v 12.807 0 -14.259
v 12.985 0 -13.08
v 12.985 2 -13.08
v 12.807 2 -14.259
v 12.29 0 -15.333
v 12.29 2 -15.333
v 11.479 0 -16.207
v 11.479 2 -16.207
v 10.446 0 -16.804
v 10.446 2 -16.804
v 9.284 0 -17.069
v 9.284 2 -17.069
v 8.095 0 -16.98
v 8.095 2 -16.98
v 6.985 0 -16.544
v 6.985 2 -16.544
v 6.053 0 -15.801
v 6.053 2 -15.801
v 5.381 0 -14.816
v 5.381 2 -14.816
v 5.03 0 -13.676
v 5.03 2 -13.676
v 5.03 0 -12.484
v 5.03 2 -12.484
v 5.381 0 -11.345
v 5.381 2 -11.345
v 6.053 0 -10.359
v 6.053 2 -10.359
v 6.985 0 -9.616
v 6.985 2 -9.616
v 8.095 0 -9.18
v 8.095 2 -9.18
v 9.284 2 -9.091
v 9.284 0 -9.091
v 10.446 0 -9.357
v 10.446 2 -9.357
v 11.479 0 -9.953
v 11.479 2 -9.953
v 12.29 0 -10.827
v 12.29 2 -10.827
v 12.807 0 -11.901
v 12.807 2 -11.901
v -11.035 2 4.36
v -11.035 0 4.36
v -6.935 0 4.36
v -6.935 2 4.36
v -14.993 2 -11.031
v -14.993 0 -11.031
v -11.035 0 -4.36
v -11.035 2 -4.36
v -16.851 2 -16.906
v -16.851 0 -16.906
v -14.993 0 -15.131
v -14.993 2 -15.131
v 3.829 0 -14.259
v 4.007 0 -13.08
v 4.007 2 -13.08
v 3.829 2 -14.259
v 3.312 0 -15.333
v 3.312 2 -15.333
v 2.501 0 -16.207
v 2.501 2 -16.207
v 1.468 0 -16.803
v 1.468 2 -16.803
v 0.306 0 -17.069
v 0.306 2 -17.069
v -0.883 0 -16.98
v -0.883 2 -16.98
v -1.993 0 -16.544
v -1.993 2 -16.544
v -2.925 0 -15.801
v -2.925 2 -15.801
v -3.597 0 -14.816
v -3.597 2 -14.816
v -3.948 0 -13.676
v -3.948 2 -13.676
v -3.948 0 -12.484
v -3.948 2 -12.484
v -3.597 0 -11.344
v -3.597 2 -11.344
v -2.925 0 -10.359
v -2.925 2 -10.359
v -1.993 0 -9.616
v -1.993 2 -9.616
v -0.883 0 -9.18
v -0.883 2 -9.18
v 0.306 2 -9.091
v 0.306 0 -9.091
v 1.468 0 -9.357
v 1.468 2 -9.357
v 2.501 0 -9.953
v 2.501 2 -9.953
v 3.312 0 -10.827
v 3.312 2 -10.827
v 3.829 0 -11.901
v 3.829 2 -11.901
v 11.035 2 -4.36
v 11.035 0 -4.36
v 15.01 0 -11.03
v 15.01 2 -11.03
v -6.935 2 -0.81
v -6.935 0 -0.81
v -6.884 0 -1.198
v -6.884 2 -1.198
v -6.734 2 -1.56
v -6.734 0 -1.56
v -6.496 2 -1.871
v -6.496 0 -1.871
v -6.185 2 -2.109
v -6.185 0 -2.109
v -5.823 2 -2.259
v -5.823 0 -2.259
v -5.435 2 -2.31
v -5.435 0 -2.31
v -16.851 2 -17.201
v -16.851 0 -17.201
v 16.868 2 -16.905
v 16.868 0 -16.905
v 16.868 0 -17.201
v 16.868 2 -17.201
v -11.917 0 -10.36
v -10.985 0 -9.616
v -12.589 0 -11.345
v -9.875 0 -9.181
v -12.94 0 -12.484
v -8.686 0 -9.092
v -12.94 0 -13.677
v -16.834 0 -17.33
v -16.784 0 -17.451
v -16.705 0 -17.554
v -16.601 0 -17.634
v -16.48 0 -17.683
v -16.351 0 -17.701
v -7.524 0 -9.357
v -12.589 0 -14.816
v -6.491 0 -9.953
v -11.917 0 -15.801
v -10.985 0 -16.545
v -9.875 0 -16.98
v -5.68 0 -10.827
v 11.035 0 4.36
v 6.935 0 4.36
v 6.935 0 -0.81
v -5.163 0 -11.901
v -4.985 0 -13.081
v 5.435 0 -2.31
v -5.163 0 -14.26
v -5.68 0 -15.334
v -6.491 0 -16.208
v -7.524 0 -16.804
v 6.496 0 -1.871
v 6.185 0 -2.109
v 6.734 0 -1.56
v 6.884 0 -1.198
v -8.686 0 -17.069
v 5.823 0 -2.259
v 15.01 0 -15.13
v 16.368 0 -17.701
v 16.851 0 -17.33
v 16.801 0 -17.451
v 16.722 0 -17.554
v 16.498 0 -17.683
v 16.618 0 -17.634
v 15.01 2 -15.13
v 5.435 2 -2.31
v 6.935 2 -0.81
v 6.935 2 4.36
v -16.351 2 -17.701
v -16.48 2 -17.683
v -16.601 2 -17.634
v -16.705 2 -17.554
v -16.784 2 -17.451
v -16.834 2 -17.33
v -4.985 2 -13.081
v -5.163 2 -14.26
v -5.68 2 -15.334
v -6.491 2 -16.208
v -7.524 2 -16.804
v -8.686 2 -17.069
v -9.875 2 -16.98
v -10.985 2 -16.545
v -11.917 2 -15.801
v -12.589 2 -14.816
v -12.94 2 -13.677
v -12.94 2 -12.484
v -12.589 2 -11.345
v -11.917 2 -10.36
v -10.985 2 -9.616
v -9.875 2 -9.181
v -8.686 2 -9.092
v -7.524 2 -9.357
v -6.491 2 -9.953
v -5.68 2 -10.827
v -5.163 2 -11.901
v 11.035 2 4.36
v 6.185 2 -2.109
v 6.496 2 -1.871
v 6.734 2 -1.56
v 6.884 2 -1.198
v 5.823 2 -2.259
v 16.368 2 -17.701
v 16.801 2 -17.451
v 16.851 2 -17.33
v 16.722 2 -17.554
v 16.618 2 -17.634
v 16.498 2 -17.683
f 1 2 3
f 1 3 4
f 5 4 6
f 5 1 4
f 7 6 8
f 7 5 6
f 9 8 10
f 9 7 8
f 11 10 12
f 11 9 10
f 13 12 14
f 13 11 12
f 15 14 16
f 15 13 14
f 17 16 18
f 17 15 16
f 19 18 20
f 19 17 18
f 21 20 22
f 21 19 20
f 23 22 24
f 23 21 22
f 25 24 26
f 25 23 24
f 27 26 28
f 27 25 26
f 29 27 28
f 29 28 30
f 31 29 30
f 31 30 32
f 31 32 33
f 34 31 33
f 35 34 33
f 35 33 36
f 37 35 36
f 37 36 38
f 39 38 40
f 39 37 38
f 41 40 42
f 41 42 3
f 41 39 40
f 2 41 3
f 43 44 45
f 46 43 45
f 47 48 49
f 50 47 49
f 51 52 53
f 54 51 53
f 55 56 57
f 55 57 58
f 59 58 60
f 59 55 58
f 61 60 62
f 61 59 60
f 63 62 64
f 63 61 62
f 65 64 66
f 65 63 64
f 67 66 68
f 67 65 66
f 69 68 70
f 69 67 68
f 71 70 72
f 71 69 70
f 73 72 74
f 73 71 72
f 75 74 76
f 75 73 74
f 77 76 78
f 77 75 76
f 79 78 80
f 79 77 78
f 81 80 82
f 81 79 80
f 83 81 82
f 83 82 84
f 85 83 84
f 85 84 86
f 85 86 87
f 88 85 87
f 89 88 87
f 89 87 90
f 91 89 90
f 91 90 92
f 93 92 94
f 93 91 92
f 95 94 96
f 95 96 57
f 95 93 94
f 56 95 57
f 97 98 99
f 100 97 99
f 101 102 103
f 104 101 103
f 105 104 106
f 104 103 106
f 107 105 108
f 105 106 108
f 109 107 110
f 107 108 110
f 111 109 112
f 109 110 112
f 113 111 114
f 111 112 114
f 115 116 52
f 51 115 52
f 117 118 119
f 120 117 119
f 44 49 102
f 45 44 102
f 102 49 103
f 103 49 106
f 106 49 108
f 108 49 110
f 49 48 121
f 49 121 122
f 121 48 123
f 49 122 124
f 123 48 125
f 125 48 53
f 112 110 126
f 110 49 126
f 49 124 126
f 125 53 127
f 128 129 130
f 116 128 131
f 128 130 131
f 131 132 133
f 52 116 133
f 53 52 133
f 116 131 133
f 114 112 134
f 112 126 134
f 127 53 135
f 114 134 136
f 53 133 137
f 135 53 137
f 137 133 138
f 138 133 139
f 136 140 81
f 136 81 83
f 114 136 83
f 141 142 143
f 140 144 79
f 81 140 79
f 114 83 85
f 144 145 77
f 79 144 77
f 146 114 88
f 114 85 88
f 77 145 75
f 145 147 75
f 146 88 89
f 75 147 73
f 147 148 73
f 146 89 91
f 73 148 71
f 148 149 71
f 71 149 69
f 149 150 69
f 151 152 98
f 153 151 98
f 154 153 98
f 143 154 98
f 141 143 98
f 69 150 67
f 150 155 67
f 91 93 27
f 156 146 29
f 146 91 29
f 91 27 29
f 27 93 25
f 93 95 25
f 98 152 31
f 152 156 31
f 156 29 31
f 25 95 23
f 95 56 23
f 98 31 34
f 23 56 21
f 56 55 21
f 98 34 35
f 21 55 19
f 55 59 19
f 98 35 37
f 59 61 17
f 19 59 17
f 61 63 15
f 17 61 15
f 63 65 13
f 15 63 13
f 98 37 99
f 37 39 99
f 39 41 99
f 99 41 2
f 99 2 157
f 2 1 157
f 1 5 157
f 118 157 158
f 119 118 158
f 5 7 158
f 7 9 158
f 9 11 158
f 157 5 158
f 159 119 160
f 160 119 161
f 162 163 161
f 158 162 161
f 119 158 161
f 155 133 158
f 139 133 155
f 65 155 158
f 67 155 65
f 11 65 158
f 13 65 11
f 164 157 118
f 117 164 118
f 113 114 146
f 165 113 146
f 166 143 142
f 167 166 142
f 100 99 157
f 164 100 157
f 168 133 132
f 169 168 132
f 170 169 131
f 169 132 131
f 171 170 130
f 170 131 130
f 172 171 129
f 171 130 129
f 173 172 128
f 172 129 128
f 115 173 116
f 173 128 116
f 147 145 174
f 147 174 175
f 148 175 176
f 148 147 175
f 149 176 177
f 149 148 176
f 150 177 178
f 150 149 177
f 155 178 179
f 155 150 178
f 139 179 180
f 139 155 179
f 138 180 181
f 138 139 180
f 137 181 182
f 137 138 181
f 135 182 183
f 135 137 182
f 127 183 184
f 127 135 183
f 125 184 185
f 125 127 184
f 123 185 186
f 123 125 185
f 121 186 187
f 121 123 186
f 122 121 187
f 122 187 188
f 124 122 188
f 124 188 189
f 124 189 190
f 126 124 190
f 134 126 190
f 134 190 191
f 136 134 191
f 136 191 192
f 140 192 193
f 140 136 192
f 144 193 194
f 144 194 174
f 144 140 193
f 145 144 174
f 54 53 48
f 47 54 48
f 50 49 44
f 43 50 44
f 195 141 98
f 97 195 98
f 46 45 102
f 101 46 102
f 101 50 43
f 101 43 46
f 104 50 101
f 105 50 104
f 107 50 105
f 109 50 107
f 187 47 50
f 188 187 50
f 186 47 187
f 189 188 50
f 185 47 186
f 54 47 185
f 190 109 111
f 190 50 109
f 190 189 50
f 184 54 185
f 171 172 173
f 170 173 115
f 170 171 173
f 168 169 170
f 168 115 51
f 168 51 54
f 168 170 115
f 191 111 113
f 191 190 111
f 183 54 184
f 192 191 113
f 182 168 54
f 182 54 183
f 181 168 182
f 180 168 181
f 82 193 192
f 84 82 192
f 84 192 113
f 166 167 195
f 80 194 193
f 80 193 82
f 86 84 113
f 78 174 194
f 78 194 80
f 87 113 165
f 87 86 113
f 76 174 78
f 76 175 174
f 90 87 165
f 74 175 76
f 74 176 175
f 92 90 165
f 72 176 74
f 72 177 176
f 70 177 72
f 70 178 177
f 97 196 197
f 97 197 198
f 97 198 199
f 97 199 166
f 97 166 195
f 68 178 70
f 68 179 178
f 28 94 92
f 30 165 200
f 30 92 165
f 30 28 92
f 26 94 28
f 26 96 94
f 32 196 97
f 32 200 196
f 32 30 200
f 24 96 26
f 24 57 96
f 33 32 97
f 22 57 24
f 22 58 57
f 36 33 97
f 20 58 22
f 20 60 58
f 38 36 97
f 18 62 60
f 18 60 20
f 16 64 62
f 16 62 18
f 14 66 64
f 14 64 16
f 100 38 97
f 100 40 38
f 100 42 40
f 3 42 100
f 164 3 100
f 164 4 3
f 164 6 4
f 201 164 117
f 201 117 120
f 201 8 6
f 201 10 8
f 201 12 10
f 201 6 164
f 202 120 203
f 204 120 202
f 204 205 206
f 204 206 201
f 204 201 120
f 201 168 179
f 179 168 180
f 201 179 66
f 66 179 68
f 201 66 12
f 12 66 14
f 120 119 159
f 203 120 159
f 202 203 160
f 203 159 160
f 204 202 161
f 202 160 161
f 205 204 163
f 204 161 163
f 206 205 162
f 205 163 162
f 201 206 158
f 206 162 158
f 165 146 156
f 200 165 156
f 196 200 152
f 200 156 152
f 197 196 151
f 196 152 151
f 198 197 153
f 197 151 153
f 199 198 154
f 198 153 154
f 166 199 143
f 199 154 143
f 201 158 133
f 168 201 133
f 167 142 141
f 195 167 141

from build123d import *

# Parameters (mm, degrees)
ESTRUSIONE_ESTRUSIONE8_DEPTH = 2
SCHIZZO8_R                   = 4
TAGLIO_ESTRUSIONE6_DEPTH     = 2
SCHIZZO15_R                  = 4
TAGLIO_ESTRUSIONE7_DEPTH     = 2
SCHIZZO16_R                  = 4
TAGLIO_ESTRUSIONE9_DEPTH     = 2


with BuildPart() as part:
    # Schizzo2 → Estrusione-Estrusione8 (new body)
    with BuildSketch(Plane(origin=(0, 0, 0), x_dir=(1, 0, 0), z_dir=(0, 1, 0))):
        with BuildLine():
            Line((-6.935, -4.36), (-6.935, 0.81))
            ThreePointArc((-6.935, 0.81), (-6.495660172, 1.870660172), (-5.435, 2.31))
            Line((-5.435, 2.31), (5.435, 2.31))
            ThreePointArc((5.435, 2.31), (6.495660172, 1.870660172), (6.935, 0.81))
            Line((6.935, 0.81), (6.935, -4.36))
            Line((6.935, -4.36), (11.035, -4.36))
            Line((11.035, -4.36), (11.035, 4.36))
            Line((11.035, 4.36), (15.01, 11.03))
            Line((15.01, 11.03), (15.01, 15.13))
            Line((15.01, 15.13), (16.868239421, 16.905343982))
            Line((16.868239421, 16.905343982), (16.868239421, 17.200505886))
            ThreePointArc((16.868239421, 17.200505886), (16.721792811, 17.554059277), (16.368239421, 17.700505886))
            Line((16.368239421, 17.700505886), (-14.992624707, 17.700505886))
            Line((-14.992624707, 17.700505886), (-16.351038686, 17.700505886))
            ThreePointArc((-16.351038686, 17.700505886), (-16.704592076, 17.554059277), (-16.851038686, 17.200505886))
            Line((-16.851038686, 17.200505886), (-16.851038686, 16.905667142))
            Line((-16.851038686, 16.905667142), (-14.992624707, 15.130505886))
            Line((-14.992624707, 15.130505886), (-14.992624707, 11.030505886))
            Line((-14.992624707, 11.030505886), (-11.035, 4.36))
            Line((-11.035, 4.36), (-11.035, -4.36))
            Line((-11.035, -4.36), (-6.935, -4.36))
        make_face()
    extrude(amount=ESTRUSIONE_ESTRUSIONE8_DEPTH)

    # Schizzo8 → Taglio-Estrusione6 (cut)
    with BuildSketch(Plane(origin=(0, 0, 0), x_dir=(1, 0, 0), z_dir=(0, 1, 0))):
        with Locations((8.985, 13.08010159)):
            Circle(SCHIZZO8_R)
    extrude(amount=TAGLIO_ESTRUSIONE6_DEPTH, mode=Mode.SUBTRACT)

    # Schizzo15 → Taglio-Estrusione7 (cut)
    with BuildSketch(Plane(origin=(0, 0, 0), x_dir=(1, 0, 0), z_dir=(0, 1, 0))):
        with Locations((0.00688301, 13.08)):
            Circle(SCHIZZO15_R)
    extrude(amount=TAGLIO_ESTRUSIONE7_DEPTH, mode=Mode.SUBTRACT)

    # Schizzo16 → Taglio-Estrusione9 (cut)
    with BuildSketch(Plane(origin=(0, 0, 0), x_dir=(1, 0, 0), z_dir=(0, 1, 0))):
        with Locations((-8.985, 13.080505886)):
            Circle(SCHIZZO16_R)
    extrude(amount=TAGLIO_ESTRUSIONE9_DEPTH, mode=Mode.SUBTRACT)


solid = part.part
